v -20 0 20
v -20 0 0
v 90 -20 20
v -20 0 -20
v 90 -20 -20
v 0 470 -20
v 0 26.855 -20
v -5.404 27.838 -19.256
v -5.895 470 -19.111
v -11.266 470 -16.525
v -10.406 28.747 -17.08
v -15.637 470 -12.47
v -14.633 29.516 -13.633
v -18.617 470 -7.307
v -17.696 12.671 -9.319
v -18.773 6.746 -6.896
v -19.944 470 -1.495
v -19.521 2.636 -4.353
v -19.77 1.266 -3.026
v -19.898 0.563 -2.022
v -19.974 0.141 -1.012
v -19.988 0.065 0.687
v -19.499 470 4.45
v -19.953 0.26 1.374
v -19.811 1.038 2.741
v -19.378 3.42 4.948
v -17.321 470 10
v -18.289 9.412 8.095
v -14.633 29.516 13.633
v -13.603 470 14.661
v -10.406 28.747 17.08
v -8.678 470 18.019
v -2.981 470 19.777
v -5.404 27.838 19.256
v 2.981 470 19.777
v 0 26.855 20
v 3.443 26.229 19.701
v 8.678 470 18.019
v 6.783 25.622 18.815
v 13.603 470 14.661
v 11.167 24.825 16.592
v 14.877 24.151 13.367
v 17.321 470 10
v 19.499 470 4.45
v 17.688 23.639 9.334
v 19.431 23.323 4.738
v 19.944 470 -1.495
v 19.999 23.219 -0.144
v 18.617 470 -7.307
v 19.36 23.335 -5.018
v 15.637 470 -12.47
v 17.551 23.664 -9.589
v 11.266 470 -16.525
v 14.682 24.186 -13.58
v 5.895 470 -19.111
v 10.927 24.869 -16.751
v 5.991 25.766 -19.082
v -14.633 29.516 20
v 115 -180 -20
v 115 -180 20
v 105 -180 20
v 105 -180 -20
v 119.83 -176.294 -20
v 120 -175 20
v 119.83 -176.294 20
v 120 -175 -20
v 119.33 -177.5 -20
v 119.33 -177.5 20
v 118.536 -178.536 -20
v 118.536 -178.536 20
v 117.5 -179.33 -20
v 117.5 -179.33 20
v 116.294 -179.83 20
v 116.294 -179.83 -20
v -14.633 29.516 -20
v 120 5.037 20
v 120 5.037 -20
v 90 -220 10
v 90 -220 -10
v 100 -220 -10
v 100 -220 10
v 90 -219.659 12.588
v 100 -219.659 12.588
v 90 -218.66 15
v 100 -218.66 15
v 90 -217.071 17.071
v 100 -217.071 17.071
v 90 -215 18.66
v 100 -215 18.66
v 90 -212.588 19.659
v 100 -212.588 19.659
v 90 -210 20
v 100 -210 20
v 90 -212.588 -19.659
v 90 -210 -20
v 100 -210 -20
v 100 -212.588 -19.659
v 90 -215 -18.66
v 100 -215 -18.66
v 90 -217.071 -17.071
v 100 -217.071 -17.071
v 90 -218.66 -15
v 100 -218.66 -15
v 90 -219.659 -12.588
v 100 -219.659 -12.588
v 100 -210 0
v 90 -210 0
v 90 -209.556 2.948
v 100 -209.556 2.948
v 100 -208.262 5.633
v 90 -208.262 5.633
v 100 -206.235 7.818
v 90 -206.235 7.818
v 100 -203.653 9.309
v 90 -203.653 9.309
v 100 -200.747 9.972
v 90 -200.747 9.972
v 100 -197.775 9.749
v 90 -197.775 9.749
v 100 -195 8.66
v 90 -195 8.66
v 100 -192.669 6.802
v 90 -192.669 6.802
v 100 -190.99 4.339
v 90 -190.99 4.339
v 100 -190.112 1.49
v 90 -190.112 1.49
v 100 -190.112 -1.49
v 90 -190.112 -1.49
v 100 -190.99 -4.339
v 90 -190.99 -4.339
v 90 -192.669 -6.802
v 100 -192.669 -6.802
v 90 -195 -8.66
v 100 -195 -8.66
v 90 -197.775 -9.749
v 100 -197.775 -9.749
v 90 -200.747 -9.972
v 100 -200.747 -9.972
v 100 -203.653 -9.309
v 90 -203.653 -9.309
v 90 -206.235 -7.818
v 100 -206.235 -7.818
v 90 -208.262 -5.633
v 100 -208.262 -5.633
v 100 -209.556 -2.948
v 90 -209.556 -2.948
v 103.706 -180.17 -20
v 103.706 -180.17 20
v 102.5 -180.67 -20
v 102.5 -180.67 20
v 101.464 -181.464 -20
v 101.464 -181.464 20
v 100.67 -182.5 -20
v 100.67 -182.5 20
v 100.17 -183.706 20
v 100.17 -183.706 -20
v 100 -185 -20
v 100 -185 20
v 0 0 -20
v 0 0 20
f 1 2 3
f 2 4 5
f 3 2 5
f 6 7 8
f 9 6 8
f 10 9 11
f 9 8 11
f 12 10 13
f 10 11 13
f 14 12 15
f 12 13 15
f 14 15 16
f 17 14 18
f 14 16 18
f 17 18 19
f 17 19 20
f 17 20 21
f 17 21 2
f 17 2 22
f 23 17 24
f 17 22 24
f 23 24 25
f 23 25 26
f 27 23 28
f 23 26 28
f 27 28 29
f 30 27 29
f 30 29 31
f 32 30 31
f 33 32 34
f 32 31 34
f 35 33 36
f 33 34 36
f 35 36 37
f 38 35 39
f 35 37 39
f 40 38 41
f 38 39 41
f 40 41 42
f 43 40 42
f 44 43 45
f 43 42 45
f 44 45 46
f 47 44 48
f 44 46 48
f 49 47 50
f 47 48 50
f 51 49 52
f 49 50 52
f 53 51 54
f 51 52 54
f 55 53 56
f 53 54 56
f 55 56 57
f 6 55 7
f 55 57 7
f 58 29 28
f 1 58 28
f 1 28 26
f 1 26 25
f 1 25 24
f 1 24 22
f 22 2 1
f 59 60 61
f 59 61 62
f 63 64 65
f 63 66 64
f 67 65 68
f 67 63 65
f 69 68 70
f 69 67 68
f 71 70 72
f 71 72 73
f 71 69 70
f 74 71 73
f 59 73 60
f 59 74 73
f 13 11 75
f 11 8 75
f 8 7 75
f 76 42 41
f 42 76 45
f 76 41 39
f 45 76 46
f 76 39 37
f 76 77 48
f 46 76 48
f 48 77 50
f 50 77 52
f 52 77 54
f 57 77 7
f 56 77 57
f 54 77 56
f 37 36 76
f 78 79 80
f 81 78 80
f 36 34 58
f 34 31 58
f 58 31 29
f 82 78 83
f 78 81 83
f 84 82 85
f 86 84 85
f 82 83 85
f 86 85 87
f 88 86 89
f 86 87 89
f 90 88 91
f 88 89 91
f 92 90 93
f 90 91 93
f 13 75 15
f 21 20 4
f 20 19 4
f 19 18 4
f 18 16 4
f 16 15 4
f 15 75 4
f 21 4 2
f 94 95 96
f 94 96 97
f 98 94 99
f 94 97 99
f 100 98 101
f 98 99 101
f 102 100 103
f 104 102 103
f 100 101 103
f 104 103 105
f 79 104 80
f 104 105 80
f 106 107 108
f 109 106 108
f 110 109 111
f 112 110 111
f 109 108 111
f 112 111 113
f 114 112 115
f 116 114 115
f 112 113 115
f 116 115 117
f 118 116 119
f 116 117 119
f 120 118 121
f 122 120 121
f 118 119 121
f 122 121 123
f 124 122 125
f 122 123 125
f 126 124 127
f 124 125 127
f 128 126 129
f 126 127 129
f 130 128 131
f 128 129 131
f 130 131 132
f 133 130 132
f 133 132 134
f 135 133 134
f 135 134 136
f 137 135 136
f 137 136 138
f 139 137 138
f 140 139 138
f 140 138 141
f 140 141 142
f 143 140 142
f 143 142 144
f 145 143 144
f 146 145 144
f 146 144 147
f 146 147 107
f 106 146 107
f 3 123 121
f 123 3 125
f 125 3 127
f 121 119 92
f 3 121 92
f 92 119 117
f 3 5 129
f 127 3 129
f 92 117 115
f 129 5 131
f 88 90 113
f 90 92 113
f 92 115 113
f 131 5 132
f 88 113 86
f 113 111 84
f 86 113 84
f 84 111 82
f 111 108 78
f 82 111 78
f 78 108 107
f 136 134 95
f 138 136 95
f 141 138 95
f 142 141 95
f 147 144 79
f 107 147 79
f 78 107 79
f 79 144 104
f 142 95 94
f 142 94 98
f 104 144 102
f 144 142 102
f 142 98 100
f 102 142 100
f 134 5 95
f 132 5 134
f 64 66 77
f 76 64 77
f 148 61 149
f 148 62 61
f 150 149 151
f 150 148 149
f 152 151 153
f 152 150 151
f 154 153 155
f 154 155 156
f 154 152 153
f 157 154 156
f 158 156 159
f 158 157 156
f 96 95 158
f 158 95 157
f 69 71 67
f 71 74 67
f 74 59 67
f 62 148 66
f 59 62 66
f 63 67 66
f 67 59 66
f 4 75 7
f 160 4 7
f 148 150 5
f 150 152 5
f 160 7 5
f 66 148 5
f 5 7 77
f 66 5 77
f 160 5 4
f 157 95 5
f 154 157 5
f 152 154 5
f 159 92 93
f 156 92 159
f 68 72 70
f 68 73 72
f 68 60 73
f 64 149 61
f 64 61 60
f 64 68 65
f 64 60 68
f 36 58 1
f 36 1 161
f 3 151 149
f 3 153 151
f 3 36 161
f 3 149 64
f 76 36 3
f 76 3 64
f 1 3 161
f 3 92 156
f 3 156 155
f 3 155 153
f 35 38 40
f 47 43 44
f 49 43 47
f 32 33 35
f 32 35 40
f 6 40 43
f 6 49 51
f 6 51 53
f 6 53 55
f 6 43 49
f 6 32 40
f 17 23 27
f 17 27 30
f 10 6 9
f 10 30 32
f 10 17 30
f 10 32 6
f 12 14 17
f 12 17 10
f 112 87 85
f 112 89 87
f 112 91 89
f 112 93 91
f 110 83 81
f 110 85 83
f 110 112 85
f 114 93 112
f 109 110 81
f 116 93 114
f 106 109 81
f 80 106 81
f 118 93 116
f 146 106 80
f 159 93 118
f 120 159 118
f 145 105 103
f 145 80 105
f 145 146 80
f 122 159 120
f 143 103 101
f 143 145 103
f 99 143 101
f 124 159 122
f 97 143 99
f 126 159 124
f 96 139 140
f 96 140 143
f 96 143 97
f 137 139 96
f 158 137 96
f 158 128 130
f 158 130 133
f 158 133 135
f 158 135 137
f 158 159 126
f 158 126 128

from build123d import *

# Parameters (mm, degrees)
SZKIC1_R                         = 20
DODANIE_WYCI_GNI_CIE1_DEPTH      = 470
DODANIE_WYCI_GNI_CIE2_DEPTH      = 20
DODANIE_WYCI_GNI_CIE2_DEPTH_BACK = 20
WYTNIJ_WYCI_GNI_CIE1_REACH       = 485.115
SZKIC3_R                         = 10
SZKIC4_W                         = 40
SZKIC4_H                         = 40
WYTNIJ_WYCI_GNI_CIE2_DEPTH       = 20
ZAOKR_GLENIE1_R                  = 5
ZAOKR_GLENIE2_R                  = 10


with BuildPart() as part:
    # Szkic1 → Dodanie-wyciągnięcie1 (new body)
    with BuildSketch(Plane(origin=(0, 0, 0), x_dir=(1, 0, 0), z_dir=(0, 1, 0))):
        with Locations(Location((0, 0, 0), (0, 0, 90))):
            Circle(SZKIC1_R)
    extrude(amount=DODANIE_WYCI_GNI_CIE1_DEPTH)

    # Szkic2 → Dodanie-wyciągnięcie2 (add, two sides: drawn at the far end of the back side and taken through both)
    with BuildSketch(Plane.XY.offset(-DODANIE_WYCI_GNI_CIE2_DEPTH_BACK)):
        Polygon((-20, 0), (90, -20), (90, -220), (120, -220), (120, 5.037290602), (-14.633436854, 29.516097303), align=None)
    extrude(amount=DODANIE_WYCI_GNI_CIE2_DEPTH + DODANIE_WYCI_GNI_CIE2_DEPTH_BACK)

    # Szkic3 → Wytnij-wyciągnięcie1 (cut, up to next)
    with BuildSketch(Plane.ZY.offset(-90), mode=Mode.PRIVATE) as wytnij_wyci_gni_cie1_sk1:
        with Locations(Location((0, -200, 0), (0, 0, 270))):
            Circle(SZKIC3_R)
    wytnij_wyci_gni_cie1_tool1 = extrude(wytnij_wyci_gni_cie1_sk1.sketch, amount=-WYTNIJ_WYCI_GNI_CIE1_REACH, mode=Mode.PRIVATE) & part.part
    add(wytnij_wyci_gni_cie1_tool1.solids().sort_by_distance((90, -200, 0))[0], mode=Mode.SUBTRACT)

    # Szkic4 → Wytnij-wyciągnięcie2 (cut)
    with BuildSketch(Plane(origin=(120, 0, 0), x_dir=(0, 0, -1), z_dir=(1, 0, 0))):
        with Locations((0, -200)):
            Rectangle(SZKIC4_W, SZKIC4_H)
    extrude(amount=-WYTNIJ_WYCI_GNI_CIE2_DEPTH, mode=Mode.SUBTRACT)

    # Zaokrąglenie1
    zaokr_glenie1_edges = [part.edges().sort_by_distance(p)[0] for p in [
        (120, -180, 0),
        (100, -180, 0),
    ]]
    fillet(zaokr_glenie1_edges, radius=ZAOKR_GLENIE1_R)

    # Zaokrąglenie2
    zaokr_glenie2_edges = [part.edges().sort_by_distance(p)[0] for p in [
        (95, -220, -20),
        (95, -220, 20),
    ]]
    fillet(zaokr_glenie2_edges, radius=ZAOKR_GLENIE2_R)


solid = part.part
